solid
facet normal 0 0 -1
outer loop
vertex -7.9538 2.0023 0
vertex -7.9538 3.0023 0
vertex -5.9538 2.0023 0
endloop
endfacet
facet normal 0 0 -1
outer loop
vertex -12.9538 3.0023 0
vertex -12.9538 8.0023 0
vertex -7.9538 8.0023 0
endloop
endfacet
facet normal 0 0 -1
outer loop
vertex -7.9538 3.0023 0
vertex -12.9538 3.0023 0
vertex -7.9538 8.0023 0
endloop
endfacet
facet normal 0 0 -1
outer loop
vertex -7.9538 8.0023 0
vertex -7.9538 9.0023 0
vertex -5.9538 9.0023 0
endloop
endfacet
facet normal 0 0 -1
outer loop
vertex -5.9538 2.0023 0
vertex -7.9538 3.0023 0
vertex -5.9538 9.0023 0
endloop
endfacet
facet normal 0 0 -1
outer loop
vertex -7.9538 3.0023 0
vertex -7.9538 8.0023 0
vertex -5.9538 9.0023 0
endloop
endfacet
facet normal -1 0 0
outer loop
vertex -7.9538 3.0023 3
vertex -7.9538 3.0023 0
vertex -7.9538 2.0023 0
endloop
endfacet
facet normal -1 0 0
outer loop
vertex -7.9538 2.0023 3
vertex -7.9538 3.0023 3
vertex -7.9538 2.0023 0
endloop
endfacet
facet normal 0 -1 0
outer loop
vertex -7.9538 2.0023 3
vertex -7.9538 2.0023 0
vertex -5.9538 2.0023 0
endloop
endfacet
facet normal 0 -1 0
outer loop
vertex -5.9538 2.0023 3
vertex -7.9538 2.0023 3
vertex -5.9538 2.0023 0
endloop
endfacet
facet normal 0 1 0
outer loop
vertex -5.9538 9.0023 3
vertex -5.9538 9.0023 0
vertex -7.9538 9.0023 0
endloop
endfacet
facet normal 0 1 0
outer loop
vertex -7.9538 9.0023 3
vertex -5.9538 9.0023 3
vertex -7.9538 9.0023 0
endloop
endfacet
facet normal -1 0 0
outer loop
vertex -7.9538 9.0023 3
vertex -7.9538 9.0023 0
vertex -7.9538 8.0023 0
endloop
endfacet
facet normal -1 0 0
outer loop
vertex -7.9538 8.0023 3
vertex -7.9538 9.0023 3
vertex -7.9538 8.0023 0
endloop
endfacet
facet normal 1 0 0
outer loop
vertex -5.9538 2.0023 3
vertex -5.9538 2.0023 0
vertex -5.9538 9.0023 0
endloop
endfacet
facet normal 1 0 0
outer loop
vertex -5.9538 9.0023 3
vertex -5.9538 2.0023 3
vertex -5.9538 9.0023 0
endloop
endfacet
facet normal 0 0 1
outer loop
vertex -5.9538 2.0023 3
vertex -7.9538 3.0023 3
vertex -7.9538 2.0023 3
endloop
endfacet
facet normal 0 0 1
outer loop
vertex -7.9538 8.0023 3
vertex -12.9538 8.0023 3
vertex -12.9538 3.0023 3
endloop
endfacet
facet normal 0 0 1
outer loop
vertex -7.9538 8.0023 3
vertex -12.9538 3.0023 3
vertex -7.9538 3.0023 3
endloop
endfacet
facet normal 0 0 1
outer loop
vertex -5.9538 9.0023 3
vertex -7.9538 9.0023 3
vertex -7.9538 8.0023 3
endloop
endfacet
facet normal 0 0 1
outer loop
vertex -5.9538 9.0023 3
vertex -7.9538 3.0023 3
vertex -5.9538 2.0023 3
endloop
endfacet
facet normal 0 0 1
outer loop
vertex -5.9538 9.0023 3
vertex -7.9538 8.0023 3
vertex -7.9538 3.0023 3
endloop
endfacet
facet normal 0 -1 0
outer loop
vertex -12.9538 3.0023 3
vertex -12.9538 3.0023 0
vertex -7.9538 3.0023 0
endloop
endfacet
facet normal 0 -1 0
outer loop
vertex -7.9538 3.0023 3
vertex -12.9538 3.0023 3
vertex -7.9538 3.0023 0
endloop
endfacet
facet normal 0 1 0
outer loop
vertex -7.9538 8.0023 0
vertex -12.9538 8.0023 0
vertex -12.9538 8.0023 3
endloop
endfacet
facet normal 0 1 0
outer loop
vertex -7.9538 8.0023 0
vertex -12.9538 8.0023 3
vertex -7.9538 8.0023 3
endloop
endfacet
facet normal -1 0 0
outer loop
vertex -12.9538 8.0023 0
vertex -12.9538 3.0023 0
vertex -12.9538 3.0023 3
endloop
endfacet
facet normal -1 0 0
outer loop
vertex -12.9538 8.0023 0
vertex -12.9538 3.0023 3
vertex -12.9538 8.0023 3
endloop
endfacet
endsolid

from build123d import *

# Parameters (mm, degrees)
CROQUIS1_W              = 5
CROQUIS1_H              = 5
SALIENTE_EXTRUIR1_DEPTH = 3


with BuildPart() as part:
    # Croquis1 → Saliente-Extruir1 (new body)
    with BuildSketch(Plane.XY):
        with Locations((-10.453849245, 5.502257497)):
            Rectangle(CROQUIS1_W, CROQUIS1_H)
        Polygon((-7.953849245, 9.002257497), (-7.953849245, 8.002257497), (-7.953849245, 3.002257497), (-7.953849245, 2.002257497), (-5.953849245, 2.002257497), (-5.953849245, 9.002257497), align=None)
    extrude(amount=SALIENTE_EXTRUIR1_DEPTH)


solid = part.part
